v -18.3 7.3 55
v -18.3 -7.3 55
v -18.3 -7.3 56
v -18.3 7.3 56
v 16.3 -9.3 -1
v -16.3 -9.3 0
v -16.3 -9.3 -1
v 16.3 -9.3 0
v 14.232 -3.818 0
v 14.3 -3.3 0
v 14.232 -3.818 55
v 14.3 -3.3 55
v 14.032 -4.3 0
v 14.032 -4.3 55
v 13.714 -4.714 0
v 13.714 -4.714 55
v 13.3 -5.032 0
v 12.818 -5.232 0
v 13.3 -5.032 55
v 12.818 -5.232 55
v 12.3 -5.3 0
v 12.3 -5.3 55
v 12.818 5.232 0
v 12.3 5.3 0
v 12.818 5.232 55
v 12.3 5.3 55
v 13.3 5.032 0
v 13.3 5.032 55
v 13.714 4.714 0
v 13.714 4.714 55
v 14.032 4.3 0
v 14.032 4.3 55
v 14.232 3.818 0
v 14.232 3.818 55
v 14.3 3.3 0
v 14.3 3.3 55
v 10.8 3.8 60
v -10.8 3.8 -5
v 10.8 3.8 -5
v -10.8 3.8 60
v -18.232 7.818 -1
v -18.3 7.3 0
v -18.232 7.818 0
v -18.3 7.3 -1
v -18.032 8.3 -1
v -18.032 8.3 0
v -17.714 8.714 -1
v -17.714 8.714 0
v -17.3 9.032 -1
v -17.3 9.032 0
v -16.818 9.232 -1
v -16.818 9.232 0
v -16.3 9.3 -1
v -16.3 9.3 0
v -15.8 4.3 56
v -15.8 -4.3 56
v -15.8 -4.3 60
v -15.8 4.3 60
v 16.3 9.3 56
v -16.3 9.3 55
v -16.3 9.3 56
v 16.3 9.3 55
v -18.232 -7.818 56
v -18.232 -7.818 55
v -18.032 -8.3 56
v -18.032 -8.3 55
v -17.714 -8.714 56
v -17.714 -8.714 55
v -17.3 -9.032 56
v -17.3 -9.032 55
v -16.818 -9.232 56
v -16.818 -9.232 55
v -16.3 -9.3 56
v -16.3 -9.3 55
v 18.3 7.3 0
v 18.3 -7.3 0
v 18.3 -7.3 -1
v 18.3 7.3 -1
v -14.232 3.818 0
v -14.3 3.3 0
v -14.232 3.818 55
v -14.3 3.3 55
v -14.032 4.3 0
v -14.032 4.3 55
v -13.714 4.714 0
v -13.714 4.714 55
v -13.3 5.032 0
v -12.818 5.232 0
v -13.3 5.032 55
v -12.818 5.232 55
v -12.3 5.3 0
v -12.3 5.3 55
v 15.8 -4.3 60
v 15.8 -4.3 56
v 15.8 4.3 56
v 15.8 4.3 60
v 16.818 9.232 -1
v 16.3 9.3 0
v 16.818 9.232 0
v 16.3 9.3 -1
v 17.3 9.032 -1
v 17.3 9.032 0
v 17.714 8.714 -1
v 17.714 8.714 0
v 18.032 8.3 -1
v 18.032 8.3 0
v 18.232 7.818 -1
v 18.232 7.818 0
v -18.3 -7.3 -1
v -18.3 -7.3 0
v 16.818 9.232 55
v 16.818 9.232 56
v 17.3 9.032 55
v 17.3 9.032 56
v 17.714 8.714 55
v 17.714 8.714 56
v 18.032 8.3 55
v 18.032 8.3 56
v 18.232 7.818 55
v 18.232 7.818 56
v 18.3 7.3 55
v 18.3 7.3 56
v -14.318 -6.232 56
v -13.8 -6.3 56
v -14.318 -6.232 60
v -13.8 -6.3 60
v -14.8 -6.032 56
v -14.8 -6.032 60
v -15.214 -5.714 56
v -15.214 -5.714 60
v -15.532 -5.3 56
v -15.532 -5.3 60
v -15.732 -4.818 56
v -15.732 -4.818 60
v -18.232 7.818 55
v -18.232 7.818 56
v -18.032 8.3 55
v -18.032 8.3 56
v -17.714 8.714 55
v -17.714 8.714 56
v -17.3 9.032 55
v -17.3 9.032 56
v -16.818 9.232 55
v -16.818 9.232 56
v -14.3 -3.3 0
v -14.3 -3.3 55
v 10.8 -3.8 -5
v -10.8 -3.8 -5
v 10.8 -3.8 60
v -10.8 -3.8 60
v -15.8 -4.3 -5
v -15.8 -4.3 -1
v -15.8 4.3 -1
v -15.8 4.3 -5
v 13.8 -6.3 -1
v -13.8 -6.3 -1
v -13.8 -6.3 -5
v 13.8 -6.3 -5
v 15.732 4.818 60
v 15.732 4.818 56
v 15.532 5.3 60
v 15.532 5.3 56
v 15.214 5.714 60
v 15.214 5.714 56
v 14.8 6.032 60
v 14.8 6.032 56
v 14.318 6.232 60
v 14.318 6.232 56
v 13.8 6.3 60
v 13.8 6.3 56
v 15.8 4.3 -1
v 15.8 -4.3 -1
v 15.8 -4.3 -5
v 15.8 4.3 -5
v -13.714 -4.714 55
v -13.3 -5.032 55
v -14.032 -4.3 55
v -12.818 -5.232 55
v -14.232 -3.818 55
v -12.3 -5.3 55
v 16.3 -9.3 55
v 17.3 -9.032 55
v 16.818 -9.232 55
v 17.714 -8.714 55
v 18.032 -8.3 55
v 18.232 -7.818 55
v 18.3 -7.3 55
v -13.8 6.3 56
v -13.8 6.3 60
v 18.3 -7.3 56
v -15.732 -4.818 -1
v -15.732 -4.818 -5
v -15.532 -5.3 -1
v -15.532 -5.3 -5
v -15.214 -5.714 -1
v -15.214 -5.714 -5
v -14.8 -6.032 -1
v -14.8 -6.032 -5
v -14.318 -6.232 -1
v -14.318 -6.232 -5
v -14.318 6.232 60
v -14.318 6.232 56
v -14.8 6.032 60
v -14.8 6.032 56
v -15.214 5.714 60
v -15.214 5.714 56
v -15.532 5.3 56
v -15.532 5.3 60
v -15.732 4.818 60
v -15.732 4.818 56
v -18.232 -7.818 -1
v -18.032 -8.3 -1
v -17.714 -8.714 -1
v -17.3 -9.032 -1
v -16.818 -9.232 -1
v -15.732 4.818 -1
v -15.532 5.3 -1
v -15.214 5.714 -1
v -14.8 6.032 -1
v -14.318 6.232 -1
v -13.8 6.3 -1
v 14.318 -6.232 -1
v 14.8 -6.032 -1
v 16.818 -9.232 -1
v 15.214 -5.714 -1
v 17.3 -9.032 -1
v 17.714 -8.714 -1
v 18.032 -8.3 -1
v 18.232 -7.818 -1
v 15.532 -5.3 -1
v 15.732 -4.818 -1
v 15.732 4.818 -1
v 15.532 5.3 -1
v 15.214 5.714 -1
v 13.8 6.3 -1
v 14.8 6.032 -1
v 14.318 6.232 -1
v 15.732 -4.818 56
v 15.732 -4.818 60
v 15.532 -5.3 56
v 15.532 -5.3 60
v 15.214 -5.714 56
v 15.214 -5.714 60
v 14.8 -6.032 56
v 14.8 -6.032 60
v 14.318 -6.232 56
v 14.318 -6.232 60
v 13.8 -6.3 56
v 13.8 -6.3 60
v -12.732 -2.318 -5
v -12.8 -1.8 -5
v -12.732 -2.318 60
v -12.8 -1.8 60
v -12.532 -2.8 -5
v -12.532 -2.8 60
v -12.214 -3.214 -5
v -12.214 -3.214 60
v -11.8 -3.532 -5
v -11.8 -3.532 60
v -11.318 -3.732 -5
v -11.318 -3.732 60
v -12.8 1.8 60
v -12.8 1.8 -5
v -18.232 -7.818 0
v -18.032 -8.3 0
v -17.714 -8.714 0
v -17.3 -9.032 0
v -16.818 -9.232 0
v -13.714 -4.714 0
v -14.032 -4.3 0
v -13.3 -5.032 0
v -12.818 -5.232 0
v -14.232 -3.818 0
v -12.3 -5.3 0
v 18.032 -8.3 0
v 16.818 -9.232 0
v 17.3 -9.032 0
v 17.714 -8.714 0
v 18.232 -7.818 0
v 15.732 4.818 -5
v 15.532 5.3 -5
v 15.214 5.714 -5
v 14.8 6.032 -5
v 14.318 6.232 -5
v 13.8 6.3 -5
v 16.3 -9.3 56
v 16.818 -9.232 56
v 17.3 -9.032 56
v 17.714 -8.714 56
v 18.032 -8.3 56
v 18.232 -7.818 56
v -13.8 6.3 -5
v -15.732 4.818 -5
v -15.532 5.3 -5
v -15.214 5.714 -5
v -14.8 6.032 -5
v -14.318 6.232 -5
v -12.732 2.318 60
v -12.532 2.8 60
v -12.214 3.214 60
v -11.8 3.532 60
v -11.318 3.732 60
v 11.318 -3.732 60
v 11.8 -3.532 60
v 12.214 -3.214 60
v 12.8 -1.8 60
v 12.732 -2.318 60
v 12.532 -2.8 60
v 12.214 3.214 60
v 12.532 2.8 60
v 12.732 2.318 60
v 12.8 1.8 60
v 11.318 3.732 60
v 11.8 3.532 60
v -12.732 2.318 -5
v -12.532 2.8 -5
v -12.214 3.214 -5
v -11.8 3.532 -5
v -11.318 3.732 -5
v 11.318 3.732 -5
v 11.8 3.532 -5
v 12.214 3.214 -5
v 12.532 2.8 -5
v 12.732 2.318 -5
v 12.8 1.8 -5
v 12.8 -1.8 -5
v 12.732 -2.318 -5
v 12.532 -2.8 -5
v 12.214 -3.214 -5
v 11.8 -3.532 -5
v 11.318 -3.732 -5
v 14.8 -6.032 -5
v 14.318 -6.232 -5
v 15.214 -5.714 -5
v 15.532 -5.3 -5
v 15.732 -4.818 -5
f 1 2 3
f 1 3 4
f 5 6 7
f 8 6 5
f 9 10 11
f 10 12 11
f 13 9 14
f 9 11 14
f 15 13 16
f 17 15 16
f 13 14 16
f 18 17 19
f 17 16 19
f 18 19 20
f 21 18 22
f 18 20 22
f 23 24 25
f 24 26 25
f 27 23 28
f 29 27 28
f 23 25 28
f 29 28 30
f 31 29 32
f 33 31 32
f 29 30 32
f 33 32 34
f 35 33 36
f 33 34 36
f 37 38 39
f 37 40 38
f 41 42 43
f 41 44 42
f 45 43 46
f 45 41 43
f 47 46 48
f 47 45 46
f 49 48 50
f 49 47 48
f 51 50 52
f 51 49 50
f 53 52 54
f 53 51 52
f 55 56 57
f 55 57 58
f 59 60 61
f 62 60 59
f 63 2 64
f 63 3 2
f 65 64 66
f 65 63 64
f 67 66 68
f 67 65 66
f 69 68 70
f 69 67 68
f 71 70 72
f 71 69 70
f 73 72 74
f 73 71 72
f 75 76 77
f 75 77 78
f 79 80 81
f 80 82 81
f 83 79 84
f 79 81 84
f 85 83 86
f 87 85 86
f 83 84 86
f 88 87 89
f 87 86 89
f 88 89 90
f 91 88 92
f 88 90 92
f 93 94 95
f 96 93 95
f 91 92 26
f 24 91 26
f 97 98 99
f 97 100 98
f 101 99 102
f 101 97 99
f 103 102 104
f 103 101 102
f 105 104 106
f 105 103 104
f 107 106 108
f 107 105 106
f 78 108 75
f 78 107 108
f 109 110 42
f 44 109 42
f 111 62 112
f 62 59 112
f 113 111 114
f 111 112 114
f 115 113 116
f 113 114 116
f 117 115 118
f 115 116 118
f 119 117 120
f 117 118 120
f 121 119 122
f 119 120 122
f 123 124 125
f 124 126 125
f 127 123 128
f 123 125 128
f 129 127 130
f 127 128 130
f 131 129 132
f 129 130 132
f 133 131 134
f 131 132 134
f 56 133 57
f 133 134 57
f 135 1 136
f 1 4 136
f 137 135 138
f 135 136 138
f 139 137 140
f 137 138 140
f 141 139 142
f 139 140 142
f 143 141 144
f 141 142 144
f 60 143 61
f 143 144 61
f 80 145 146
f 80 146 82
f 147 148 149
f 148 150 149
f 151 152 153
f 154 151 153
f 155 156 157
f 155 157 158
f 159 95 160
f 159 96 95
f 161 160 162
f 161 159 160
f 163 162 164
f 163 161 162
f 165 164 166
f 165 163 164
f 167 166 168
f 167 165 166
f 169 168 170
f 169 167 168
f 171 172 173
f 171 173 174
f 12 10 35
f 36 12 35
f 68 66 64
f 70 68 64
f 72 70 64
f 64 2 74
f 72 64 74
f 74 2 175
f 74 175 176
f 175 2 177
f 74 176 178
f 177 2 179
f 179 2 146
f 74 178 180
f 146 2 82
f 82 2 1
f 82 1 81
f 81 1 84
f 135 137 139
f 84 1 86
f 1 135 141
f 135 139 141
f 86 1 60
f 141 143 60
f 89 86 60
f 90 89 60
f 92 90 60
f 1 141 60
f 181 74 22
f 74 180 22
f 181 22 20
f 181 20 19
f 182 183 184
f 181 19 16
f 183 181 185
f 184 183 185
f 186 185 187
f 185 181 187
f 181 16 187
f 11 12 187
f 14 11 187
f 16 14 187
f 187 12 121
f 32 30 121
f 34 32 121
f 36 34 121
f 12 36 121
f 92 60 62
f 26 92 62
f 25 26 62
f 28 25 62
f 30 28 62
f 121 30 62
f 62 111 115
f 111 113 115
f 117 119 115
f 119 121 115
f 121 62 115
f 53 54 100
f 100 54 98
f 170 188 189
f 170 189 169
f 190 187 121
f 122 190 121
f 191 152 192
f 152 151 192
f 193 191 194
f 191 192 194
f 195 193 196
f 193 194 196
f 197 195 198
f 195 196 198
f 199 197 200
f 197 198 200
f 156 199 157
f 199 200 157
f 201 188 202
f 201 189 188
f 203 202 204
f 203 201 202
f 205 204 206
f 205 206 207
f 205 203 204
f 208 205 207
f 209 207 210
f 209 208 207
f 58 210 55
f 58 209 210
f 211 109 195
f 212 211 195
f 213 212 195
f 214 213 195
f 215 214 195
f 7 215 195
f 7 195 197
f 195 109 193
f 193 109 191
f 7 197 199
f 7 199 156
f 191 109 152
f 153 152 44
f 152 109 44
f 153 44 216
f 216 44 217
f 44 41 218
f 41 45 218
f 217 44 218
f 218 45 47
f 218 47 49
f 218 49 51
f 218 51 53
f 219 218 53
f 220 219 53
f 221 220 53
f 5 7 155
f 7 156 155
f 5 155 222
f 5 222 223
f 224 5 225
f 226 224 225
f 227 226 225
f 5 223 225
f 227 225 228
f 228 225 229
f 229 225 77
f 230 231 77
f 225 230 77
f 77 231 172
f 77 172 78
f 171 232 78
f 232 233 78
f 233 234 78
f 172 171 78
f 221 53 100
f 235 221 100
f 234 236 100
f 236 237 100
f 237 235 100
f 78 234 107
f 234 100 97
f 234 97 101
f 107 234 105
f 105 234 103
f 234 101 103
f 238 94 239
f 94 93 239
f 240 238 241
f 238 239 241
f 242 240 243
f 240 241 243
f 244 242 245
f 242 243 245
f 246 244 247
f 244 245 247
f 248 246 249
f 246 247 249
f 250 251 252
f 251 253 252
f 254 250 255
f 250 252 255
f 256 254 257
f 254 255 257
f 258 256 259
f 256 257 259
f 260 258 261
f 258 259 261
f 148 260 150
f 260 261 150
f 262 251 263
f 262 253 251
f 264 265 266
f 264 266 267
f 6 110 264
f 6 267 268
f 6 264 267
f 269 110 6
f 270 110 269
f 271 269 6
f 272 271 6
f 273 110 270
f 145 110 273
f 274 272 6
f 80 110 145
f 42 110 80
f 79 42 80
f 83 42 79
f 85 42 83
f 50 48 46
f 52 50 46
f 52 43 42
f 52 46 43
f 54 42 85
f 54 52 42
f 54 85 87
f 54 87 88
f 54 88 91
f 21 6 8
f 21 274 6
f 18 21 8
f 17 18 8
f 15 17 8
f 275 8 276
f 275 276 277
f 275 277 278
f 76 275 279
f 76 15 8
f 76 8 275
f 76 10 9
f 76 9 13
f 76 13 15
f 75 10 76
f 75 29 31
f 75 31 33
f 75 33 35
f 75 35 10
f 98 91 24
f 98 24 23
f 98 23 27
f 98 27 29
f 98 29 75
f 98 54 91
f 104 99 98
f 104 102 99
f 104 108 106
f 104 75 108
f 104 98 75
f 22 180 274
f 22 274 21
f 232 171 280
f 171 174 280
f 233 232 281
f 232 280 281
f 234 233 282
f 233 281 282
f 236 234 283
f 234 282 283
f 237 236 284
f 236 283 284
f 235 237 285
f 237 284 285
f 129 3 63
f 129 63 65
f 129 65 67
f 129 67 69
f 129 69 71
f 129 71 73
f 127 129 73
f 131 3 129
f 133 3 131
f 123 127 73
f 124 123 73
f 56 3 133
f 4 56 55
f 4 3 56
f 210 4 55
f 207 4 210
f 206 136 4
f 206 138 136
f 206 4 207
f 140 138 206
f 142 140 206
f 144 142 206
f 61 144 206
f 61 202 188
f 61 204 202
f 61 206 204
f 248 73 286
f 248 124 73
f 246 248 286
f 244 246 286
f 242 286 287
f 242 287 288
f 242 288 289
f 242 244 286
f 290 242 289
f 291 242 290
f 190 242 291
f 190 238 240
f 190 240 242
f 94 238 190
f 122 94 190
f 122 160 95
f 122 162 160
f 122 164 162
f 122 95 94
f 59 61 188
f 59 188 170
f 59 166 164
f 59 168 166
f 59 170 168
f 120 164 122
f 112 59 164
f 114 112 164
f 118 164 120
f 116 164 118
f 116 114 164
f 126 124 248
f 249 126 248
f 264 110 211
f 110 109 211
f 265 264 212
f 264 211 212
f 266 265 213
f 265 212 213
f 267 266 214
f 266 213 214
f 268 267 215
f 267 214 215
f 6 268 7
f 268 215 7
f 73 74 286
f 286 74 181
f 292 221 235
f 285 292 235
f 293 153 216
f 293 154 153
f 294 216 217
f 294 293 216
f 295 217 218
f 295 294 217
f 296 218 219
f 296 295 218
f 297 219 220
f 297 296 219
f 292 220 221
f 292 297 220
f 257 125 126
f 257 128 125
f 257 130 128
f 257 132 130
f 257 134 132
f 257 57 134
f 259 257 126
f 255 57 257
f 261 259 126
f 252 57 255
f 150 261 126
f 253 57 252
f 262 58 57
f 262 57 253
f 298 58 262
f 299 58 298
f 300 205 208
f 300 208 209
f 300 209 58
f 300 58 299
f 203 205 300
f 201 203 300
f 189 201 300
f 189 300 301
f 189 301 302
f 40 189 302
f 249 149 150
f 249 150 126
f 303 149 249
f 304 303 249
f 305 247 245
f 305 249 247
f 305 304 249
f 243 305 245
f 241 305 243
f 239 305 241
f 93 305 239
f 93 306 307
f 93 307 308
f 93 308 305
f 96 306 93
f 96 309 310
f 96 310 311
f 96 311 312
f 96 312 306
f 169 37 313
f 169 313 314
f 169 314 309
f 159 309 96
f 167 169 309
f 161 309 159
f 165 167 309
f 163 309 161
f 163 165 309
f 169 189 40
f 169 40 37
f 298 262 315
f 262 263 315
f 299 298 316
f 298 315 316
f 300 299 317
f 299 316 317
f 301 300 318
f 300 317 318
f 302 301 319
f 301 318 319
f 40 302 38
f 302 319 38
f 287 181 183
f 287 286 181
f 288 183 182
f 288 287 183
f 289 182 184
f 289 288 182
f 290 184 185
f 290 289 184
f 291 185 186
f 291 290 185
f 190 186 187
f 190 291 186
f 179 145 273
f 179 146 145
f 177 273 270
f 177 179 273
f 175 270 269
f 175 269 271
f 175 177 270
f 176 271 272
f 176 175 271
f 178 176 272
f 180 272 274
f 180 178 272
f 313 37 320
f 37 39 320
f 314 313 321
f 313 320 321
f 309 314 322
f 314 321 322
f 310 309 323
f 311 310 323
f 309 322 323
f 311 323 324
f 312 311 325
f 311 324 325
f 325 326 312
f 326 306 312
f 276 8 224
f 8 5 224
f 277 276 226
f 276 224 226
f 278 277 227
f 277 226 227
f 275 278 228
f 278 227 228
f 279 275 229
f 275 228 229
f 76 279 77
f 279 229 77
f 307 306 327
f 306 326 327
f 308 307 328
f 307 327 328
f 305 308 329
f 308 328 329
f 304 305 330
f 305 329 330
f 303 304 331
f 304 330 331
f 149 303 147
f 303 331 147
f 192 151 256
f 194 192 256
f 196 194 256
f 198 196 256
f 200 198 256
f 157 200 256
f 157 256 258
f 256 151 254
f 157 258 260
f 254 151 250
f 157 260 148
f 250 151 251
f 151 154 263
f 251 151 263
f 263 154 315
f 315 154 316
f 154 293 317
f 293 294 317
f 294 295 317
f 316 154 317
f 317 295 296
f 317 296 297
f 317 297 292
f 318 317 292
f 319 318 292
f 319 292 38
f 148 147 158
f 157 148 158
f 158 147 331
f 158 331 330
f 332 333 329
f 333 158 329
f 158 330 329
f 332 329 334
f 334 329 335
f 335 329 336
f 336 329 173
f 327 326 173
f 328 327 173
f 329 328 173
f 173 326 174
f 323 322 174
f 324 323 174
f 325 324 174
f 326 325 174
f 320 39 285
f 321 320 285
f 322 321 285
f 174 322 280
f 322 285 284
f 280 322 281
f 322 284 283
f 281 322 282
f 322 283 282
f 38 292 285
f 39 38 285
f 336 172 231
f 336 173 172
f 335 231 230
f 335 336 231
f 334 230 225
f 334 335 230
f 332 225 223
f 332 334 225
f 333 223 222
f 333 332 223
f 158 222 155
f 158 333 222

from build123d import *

# Parameters (mm, degrees)
SKETCH1_W           = 28.6
SKETCH1_H           = 10.6
SKETCH1_W_2         = 25.6
SKETCH1_H_2         = 7.6
BOSS_EXTRUDE1_DEPTH = 55
SKETCH2_W           = 36.6
SKETCH2_H           = 18.6
SKETCH2_W_2         = 25.6
SKETCH2_H_2         = 7.6
BOSS_EXTRUDE3_DEPTH = 1
SKETCH3_W           = 31.6
SKETCH3_H           = 12.6
SKETCH3_W_2         = 25.6
SKETCH3_H_2         = 7.6
BOSS_EXTRUDE4_DEPTH = 4
FILLET1_R           = 2
FILLET2_R           = 2


with BuildPart() as part:
    # Sketch1 → Boss-Extrude1 (new body)
    with BuildSketch(Plane.XY):
        Rectangle(SKETCH1_W, SKETCH1_H)
        Rectangle(SKETCH1_W_2, SKETCH1_H_2, mode=Mode.SUBTRACT)
    extrude(amount=BOSS_EXTRUDE1_DEPTH)

    # Sketch2 → Boss-Extrude3 (add)
    with BuildSketch(Plane.XY.offset(55)):
        Rectangle(SKETCH2_W, SKETCH2_H)
        Rectangle(SKETCH2_W_2, SKETCH2_H_2, mode=Mode.SUBTRACT)
    boss_extrude3 = extrude(amount=BOSS_EXTRUDE3_DEPTH)

    # Sketch3 → Boss-Extrude4 (add)
    with BuildSketch(Plane.XY.offset(56)):
        Rectangle(SKETCH3_W, SKETCH3_H)
        Rectangle(SKETCH3_W_2, SKETCH3_H_2, mode=Mode.SUBTRACT)
    boss_extrude4 = extrude(amount=BOSS_EXTRUDE4_DEPTH)

    # Mirror1: Boss-Extrude3, Boss-Extrude4 across plane
    add(boss_extrude3.mirror(Plane(origin=(0, 0, 27.5), x_dir=(1, 0, 0), z_dir=(0, 0, -1))))
    add(boss_extrude4.mirror(Plane(origin=(0, 0, 27.5), x_dir=(1, 0, 0), z_dir=(0, 0, -1))))

    # Fillet1
    fillet1_edges = [part.edges().sort_by_distance(p)[0] for p in [
        (12.8, -3.8, 27.5),
        (12.8, 3.8, 27.5),
        (-12.8, 3.8, 27.5),
        (-12.8, -3.8, 27.5),
        (15.8, -6.3, 58),
        (15.8, 6.3, 58),
        (-15.8, 6.3, 58),
        (-15.8, -6.3, 58),
        (14.3, -5.3, 27.5),
        (-14.3, -5.3, 27.5),
        (-14.3, 5.3, 27.5),
        (14.3, 5.3, 27.5),
        (15.8, 6.3, -3),
        (15.8, -6.3, -3),
        (-15.8, -6.3, -3),
        (-15.8, 6.3, -3),
    ]]
    fillet(fillet1_edges, radius=FILLET1_R)

    # Fillet2
    fillet2_edges = [part.edges().sort_by_distance(p)[0] for p in [
        (18.3, -9.3, 55.5),
        (18.3, 9.3, 55.5),
        (-18.3, 9.3, 55.5),
        (-18.3, -9.3, 55.5),
        (18.3, 9.3, -0.5),
        (18.3, -9.3, -0.5),
        (-18.3, -9.3, -0.5),
        (-18.3, 9.3, -0.5),
    ]]
    fillet(fillet2_edges, radius=FILLET2_R)


solid = part.part
